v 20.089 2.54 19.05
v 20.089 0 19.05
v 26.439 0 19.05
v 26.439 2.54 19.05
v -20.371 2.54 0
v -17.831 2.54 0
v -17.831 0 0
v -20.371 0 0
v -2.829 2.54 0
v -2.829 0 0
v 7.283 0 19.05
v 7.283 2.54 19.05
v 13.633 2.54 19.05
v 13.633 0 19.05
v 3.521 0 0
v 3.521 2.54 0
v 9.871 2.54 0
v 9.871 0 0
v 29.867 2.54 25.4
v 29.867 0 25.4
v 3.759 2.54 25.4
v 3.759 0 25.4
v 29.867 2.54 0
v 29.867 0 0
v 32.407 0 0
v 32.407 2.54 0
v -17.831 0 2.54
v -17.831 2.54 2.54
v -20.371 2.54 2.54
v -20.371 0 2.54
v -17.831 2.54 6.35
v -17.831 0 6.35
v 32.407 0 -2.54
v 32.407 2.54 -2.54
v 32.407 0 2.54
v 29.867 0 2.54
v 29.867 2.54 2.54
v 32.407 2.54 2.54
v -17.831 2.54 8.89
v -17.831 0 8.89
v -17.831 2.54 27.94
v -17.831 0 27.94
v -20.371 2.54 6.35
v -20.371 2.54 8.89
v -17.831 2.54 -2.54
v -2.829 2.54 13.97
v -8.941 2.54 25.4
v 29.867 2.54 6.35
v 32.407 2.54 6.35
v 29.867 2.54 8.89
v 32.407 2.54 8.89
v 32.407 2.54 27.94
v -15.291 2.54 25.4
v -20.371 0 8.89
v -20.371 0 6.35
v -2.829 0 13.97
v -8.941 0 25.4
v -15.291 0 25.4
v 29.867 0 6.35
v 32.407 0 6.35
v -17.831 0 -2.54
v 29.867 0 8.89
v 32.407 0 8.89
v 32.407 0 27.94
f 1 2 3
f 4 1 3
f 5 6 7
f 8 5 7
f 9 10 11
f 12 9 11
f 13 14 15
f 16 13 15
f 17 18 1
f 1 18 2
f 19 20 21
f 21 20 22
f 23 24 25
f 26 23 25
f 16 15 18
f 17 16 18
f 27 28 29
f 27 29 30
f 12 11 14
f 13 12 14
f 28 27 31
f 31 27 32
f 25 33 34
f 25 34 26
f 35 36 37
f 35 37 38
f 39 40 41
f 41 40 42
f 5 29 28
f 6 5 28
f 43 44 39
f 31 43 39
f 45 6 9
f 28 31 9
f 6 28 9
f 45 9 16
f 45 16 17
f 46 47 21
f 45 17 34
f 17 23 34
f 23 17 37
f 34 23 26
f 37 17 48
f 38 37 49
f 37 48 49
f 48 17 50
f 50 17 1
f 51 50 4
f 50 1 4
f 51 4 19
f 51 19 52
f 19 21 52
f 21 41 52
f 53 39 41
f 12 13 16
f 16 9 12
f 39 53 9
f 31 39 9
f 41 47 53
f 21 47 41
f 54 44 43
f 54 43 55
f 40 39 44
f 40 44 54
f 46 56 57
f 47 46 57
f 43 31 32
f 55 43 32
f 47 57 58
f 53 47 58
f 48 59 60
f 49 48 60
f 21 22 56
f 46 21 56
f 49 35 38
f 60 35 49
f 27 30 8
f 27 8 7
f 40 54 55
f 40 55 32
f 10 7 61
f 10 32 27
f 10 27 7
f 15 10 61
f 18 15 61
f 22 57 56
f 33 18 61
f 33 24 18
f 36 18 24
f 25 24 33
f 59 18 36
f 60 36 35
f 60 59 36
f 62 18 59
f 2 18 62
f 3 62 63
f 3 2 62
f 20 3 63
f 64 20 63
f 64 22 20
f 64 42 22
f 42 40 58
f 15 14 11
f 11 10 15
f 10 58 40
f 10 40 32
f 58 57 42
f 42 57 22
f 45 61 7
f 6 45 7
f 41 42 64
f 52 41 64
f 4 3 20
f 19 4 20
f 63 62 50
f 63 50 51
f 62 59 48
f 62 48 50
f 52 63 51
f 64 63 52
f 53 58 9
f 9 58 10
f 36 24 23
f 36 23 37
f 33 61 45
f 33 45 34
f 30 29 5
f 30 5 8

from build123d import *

# Parameters (mm, degrees)
F1_W     = 50.238024
F1_H     = 30.48
F2_DEPTH = 2.54
F3_DEPTH = 2.54
F4_W     = 2.54
F4_H     = 2.54
F5_DEPTH = 2.54
F6_W     = 2.54
F6_H     = 2.54
F7_DEPTH = 2.54


with BuildPart() as f2:
    # F1 (on Front) → F2 (new body)
    with BuildSketch(Plane.XZ):
        with Locations((7.288118, 12.7)):
            Rectangle(F1_W, F1_H)
    extrude(amount=-F2_DEPTH)

    # F0 (on Front) → F3 (cut, through all)
    with BuildSketch(Plane.XZ):
        Polygon((-8.940894, 25.4), (-15.290894, 25.4), (-2.829347, 0), (7.282625, 19.05), (13.632625, 19.05), (3.520653, 0), (9.870653, 0), (20.089414, 19.05), (26.439414, 19.05), (29.86713, 25.4), (3.759106, 25.4), (-2.829347, 13.97), align=None)
    extrude(amount=-F3_DEPTH, mode=Mode.SUBTRACT)

    # F4 (on face) → F5 (cut, through all)
    with BuildSketch(Plane.XZ):
        with Locations((31.13713, 7.62)):
            Rectangle(F4_W, F4_H)
        with Locations((31.13713, 1.27)):
            Rectangle(F4_W, F4_H)
    extrude(amount=-F5_DEPTH, mode=Mode.SUBTRACT)

    # F6 (on face) → F7 (join)
    with BuildSketch(Plane(origin=(-17.830894, 0, 0), x_dir=(0, -1, 0), z_dir=(-1, 0, 0))):
        with Locations((-1.27, 7.62)):
            Rectangle(F6_W, F6_H)
        with Locations((-1.27, 1.27)):
            Rectangle(F6_W, F6_H)
    extrude(amount=F7_DEPTH)


solid = f2.part
